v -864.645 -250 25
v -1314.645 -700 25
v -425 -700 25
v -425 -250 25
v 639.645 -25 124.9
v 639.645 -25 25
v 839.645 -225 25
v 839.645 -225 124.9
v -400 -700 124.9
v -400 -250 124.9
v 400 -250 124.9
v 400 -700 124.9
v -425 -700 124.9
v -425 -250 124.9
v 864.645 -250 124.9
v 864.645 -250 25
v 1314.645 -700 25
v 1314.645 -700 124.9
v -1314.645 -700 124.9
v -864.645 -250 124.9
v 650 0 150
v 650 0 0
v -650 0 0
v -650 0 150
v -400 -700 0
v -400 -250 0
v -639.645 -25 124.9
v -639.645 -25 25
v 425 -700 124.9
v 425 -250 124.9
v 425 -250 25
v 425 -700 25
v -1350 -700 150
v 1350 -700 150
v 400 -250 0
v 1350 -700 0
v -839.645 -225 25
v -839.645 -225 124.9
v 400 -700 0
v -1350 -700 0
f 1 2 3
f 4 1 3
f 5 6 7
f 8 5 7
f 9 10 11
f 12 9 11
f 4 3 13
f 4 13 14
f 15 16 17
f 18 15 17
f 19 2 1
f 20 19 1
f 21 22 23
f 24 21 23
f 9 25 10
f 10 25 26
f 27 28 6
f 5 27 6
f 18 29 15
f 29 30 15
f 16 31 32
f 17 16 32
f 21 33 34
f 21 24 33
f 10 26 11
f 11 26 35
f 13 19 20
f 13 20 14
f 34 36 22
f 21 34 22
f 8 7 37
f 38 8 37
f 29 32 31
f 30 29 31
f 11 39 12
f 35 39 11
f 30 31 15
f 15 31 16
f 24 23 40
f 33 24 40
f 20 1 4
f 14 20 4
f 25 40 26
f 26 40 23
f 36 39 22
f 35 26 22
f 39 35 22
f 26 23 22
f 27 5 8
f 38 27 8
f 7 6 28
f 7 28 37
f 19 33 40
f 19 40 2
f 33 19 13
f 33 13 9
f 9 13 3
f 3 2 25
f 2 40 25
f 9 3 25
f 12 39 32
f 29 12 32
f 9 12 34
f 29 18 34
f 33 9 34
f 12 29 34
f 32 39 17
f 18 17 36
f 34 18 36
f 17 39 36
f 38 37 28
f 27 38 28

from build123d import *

# Parameters (mm, degrees)
F0_W     = 25
F0_H     = 450
F1_DEPTH = 125
F2_DEPTH = 25
F3_START = 124.9
F0_W_2   = 400
F3_DEPTH = 25.1


with BuildPart() as f1:
    # F0 (on Top) → F1 (new body)
    with BuildSketch(Plane.XY):
        Polygon((-864.6446609407, -250), (-900, -250), (-1350, -700), (-1314.6446609407, -700), align=None)
        Polygon((-839.6446609407, -225), (-875, -225), (-900, -250), (-864.6446609407, -250), align=None)
        Polygon((-614.6446609407, 0), (-650, 0), (-875, -225), (-839.6446609407, -225), (-639.6446609407, -25), align=None)
        Polygon((0, -225), (-839.6446609407, -225), (-864.6446609407, -250), (-425, -250), (-400, -250), (0, -250), align=None)
        Polygon((0, 0), (-614.6446609407, 0), (-639.6446609407, -25), (0, -25), align=None)
        Polygon((614.6446609407, 0), (0, 0), (0, -25), (639.6446609407, -25), align=None)
        Polygon((839.6446609407, -225), (0, -225), (0, -250), (400, -250), (425, -250), (864.6446609407, -250), align=None)
        with Locations((412.5, -475)):
            Rectangle(F0_W, F0_H)
        with Locations((-412.5, -475)):
            Rectangle(F0_W, F0_H)
        Polygon((650, 0), (614.6446609407, 0), (639.6446609407, -25), (839.6446609407, -225), (875, -225), align=None)
        Polygon((900, -250), (864.6446609407, -250), (1314.6446609407, -700), (1350, -700), align=None)
        Polygon((875, -225), (839.6446609407, -225), (864.6446609407, -250), (900, -250), align=None)
    extrude(amount=F1_DEPTH)

    # F0 (on Top) → F2 (join)
    with BuildSketch(Plane.XY):
        Polygon((1314.6446609407, -700), (864.6446609407, -250), (425, -250), (425, -700), align=None)
        Polygon((839.6446609407, -225), (0, -225), (0, -250), (400, -250), (425, -250), (864.6446609407, -250), align=None)
        Polygon((875, -225), (839.6446609407, -225), (864.6446609407, -250), (900, -250), align=None)
        Polygon((900, -250), (864.6446609407, -250), (1314.6446609407, -700), (1350, -700), align=None)
        Polygon((650, 0), (614.6446609407, 0), (639.6446609407, -25), (839.6446609407, -225), (875, -225), align=None)
        Polygon((639.6446609407, -25), (0, -25), (0, -225), (839.6446609407, -225), align=None)
        with Locations((412.5, -475)):
            Rectangle(F0_W, F0_H)
        Polygon((614.6446609407, 0), (0, 0), (0, -25), (639.6446609407, -25), align=None)
        Polygon((0, 0), (-614.6446609407, 0), (-639.6446609407, -25), (0, -25), align=None)
        Polygon((0, -25), (-639.6446609407, -25), (-839.6446609407, -225), (0, -225), align=None)
        Polygon((0, -225), (-839.6446609407, -225), (-864.6446609407, -250), (-425, -250), (-400, -250), (0, -250), align=None)
        with Locations((-412.5, -475)):
            Rectangle(F0_W, F0_H)
        Polygon((-425, -250), (-864.6446609407, -250), (-1314.6446609407, -700), (-425, -700), align=None)
        Polygon((-614.6446609407, 0), (-650, 0), (-875, -225), (-839.6446609407, -225), (-639.6446609407, -25), align=None)
        Polygon((-839.6446609407, -225), (-875, -225), (-900, -250), (-864.6446609407, -250), align=None)
        Polygon((-864.6446609407, -250), (-900, -250), (-1350, -700), (-1314.6446609407, -700), align=None)
    extrude(amount=F2_DEPTH)

    # F0 (on Top) → F3 (join)
    with BuildSketch(Plane.XY.offset(F3_START)):
        Polygon((-614.6446609407, 0), (-650, 0), (-875, -225), (-839.6446609407, -225), (-639.6446609407, -25), align=None)
        Polygon((0, 0), (-614.6446609407, 0), (-639.6446609407, -25), (0, -25), align=None)
        Polygon((-839.6446609407, -225), (-875, -225), (-900, -250), (-864.6446609407, -250), align=None)
        Polygon((614.6446609407, 0), (0, 0), (0, -25), (639.6446609407, -25), align=None)
        Polygon((-864.6446609407, -250), (-900, -250), (-1350, -700), (-1314.6446609407, -700), align=None)
        Polygon((650, 0), (614.6446609407, 0), (639.6446609407, -25), (839.6446609407, -225), (875, -225), align=None)
        Polygon((-425, -250), (-864.6446609407, -250), (-1314.6446609407, -700), (-425, -700), align=None)
        with Locations((-412.5, -475)):
            Rectangle(F0_W, F0_H)
        with Locations((200, -475)):
            Rectangle(F0_W_2, F0_H)
        with Locations((-200, -475)):
            Rectangle(F0_W_2, F0_H)
        Polygon((875, -225), (839.6446609407, -225), (864.6446609407, -250), (900, -250), align=None)
        with Locations((412.5, -475)):
            Rectangle(F0_W, F0_H)
        Polygon((1314.6446609407, -700), (864.6446609407, -250), (425, -250), (425, -700), align=None)
        Polygon((900, -250), (864.6446609407, -250), (1314.6446609407, -700), (1350, -700), align=None)
        Polygon((639.6446609407, -25), (0, -25), (0, -225), (839.6446609407, -225), align=None)
        Polygon((0, -25), (-639.6446609407, -25), (-839.6446609407, -225), (0, -225), align=None)
        Polygon((839.6446609407, -225), (0, -225), (0, -250), (400, -250), (425, -250), (864.6446609407, -250), align=None)
        Polygon((0, -225), (-839.6446609407, -225), (-864.6446609407, -250), (-425, -250), (-400, -250), (0, -250), align=None)
    extrude(amount=F3_DEPTH)


solid = f1.part
